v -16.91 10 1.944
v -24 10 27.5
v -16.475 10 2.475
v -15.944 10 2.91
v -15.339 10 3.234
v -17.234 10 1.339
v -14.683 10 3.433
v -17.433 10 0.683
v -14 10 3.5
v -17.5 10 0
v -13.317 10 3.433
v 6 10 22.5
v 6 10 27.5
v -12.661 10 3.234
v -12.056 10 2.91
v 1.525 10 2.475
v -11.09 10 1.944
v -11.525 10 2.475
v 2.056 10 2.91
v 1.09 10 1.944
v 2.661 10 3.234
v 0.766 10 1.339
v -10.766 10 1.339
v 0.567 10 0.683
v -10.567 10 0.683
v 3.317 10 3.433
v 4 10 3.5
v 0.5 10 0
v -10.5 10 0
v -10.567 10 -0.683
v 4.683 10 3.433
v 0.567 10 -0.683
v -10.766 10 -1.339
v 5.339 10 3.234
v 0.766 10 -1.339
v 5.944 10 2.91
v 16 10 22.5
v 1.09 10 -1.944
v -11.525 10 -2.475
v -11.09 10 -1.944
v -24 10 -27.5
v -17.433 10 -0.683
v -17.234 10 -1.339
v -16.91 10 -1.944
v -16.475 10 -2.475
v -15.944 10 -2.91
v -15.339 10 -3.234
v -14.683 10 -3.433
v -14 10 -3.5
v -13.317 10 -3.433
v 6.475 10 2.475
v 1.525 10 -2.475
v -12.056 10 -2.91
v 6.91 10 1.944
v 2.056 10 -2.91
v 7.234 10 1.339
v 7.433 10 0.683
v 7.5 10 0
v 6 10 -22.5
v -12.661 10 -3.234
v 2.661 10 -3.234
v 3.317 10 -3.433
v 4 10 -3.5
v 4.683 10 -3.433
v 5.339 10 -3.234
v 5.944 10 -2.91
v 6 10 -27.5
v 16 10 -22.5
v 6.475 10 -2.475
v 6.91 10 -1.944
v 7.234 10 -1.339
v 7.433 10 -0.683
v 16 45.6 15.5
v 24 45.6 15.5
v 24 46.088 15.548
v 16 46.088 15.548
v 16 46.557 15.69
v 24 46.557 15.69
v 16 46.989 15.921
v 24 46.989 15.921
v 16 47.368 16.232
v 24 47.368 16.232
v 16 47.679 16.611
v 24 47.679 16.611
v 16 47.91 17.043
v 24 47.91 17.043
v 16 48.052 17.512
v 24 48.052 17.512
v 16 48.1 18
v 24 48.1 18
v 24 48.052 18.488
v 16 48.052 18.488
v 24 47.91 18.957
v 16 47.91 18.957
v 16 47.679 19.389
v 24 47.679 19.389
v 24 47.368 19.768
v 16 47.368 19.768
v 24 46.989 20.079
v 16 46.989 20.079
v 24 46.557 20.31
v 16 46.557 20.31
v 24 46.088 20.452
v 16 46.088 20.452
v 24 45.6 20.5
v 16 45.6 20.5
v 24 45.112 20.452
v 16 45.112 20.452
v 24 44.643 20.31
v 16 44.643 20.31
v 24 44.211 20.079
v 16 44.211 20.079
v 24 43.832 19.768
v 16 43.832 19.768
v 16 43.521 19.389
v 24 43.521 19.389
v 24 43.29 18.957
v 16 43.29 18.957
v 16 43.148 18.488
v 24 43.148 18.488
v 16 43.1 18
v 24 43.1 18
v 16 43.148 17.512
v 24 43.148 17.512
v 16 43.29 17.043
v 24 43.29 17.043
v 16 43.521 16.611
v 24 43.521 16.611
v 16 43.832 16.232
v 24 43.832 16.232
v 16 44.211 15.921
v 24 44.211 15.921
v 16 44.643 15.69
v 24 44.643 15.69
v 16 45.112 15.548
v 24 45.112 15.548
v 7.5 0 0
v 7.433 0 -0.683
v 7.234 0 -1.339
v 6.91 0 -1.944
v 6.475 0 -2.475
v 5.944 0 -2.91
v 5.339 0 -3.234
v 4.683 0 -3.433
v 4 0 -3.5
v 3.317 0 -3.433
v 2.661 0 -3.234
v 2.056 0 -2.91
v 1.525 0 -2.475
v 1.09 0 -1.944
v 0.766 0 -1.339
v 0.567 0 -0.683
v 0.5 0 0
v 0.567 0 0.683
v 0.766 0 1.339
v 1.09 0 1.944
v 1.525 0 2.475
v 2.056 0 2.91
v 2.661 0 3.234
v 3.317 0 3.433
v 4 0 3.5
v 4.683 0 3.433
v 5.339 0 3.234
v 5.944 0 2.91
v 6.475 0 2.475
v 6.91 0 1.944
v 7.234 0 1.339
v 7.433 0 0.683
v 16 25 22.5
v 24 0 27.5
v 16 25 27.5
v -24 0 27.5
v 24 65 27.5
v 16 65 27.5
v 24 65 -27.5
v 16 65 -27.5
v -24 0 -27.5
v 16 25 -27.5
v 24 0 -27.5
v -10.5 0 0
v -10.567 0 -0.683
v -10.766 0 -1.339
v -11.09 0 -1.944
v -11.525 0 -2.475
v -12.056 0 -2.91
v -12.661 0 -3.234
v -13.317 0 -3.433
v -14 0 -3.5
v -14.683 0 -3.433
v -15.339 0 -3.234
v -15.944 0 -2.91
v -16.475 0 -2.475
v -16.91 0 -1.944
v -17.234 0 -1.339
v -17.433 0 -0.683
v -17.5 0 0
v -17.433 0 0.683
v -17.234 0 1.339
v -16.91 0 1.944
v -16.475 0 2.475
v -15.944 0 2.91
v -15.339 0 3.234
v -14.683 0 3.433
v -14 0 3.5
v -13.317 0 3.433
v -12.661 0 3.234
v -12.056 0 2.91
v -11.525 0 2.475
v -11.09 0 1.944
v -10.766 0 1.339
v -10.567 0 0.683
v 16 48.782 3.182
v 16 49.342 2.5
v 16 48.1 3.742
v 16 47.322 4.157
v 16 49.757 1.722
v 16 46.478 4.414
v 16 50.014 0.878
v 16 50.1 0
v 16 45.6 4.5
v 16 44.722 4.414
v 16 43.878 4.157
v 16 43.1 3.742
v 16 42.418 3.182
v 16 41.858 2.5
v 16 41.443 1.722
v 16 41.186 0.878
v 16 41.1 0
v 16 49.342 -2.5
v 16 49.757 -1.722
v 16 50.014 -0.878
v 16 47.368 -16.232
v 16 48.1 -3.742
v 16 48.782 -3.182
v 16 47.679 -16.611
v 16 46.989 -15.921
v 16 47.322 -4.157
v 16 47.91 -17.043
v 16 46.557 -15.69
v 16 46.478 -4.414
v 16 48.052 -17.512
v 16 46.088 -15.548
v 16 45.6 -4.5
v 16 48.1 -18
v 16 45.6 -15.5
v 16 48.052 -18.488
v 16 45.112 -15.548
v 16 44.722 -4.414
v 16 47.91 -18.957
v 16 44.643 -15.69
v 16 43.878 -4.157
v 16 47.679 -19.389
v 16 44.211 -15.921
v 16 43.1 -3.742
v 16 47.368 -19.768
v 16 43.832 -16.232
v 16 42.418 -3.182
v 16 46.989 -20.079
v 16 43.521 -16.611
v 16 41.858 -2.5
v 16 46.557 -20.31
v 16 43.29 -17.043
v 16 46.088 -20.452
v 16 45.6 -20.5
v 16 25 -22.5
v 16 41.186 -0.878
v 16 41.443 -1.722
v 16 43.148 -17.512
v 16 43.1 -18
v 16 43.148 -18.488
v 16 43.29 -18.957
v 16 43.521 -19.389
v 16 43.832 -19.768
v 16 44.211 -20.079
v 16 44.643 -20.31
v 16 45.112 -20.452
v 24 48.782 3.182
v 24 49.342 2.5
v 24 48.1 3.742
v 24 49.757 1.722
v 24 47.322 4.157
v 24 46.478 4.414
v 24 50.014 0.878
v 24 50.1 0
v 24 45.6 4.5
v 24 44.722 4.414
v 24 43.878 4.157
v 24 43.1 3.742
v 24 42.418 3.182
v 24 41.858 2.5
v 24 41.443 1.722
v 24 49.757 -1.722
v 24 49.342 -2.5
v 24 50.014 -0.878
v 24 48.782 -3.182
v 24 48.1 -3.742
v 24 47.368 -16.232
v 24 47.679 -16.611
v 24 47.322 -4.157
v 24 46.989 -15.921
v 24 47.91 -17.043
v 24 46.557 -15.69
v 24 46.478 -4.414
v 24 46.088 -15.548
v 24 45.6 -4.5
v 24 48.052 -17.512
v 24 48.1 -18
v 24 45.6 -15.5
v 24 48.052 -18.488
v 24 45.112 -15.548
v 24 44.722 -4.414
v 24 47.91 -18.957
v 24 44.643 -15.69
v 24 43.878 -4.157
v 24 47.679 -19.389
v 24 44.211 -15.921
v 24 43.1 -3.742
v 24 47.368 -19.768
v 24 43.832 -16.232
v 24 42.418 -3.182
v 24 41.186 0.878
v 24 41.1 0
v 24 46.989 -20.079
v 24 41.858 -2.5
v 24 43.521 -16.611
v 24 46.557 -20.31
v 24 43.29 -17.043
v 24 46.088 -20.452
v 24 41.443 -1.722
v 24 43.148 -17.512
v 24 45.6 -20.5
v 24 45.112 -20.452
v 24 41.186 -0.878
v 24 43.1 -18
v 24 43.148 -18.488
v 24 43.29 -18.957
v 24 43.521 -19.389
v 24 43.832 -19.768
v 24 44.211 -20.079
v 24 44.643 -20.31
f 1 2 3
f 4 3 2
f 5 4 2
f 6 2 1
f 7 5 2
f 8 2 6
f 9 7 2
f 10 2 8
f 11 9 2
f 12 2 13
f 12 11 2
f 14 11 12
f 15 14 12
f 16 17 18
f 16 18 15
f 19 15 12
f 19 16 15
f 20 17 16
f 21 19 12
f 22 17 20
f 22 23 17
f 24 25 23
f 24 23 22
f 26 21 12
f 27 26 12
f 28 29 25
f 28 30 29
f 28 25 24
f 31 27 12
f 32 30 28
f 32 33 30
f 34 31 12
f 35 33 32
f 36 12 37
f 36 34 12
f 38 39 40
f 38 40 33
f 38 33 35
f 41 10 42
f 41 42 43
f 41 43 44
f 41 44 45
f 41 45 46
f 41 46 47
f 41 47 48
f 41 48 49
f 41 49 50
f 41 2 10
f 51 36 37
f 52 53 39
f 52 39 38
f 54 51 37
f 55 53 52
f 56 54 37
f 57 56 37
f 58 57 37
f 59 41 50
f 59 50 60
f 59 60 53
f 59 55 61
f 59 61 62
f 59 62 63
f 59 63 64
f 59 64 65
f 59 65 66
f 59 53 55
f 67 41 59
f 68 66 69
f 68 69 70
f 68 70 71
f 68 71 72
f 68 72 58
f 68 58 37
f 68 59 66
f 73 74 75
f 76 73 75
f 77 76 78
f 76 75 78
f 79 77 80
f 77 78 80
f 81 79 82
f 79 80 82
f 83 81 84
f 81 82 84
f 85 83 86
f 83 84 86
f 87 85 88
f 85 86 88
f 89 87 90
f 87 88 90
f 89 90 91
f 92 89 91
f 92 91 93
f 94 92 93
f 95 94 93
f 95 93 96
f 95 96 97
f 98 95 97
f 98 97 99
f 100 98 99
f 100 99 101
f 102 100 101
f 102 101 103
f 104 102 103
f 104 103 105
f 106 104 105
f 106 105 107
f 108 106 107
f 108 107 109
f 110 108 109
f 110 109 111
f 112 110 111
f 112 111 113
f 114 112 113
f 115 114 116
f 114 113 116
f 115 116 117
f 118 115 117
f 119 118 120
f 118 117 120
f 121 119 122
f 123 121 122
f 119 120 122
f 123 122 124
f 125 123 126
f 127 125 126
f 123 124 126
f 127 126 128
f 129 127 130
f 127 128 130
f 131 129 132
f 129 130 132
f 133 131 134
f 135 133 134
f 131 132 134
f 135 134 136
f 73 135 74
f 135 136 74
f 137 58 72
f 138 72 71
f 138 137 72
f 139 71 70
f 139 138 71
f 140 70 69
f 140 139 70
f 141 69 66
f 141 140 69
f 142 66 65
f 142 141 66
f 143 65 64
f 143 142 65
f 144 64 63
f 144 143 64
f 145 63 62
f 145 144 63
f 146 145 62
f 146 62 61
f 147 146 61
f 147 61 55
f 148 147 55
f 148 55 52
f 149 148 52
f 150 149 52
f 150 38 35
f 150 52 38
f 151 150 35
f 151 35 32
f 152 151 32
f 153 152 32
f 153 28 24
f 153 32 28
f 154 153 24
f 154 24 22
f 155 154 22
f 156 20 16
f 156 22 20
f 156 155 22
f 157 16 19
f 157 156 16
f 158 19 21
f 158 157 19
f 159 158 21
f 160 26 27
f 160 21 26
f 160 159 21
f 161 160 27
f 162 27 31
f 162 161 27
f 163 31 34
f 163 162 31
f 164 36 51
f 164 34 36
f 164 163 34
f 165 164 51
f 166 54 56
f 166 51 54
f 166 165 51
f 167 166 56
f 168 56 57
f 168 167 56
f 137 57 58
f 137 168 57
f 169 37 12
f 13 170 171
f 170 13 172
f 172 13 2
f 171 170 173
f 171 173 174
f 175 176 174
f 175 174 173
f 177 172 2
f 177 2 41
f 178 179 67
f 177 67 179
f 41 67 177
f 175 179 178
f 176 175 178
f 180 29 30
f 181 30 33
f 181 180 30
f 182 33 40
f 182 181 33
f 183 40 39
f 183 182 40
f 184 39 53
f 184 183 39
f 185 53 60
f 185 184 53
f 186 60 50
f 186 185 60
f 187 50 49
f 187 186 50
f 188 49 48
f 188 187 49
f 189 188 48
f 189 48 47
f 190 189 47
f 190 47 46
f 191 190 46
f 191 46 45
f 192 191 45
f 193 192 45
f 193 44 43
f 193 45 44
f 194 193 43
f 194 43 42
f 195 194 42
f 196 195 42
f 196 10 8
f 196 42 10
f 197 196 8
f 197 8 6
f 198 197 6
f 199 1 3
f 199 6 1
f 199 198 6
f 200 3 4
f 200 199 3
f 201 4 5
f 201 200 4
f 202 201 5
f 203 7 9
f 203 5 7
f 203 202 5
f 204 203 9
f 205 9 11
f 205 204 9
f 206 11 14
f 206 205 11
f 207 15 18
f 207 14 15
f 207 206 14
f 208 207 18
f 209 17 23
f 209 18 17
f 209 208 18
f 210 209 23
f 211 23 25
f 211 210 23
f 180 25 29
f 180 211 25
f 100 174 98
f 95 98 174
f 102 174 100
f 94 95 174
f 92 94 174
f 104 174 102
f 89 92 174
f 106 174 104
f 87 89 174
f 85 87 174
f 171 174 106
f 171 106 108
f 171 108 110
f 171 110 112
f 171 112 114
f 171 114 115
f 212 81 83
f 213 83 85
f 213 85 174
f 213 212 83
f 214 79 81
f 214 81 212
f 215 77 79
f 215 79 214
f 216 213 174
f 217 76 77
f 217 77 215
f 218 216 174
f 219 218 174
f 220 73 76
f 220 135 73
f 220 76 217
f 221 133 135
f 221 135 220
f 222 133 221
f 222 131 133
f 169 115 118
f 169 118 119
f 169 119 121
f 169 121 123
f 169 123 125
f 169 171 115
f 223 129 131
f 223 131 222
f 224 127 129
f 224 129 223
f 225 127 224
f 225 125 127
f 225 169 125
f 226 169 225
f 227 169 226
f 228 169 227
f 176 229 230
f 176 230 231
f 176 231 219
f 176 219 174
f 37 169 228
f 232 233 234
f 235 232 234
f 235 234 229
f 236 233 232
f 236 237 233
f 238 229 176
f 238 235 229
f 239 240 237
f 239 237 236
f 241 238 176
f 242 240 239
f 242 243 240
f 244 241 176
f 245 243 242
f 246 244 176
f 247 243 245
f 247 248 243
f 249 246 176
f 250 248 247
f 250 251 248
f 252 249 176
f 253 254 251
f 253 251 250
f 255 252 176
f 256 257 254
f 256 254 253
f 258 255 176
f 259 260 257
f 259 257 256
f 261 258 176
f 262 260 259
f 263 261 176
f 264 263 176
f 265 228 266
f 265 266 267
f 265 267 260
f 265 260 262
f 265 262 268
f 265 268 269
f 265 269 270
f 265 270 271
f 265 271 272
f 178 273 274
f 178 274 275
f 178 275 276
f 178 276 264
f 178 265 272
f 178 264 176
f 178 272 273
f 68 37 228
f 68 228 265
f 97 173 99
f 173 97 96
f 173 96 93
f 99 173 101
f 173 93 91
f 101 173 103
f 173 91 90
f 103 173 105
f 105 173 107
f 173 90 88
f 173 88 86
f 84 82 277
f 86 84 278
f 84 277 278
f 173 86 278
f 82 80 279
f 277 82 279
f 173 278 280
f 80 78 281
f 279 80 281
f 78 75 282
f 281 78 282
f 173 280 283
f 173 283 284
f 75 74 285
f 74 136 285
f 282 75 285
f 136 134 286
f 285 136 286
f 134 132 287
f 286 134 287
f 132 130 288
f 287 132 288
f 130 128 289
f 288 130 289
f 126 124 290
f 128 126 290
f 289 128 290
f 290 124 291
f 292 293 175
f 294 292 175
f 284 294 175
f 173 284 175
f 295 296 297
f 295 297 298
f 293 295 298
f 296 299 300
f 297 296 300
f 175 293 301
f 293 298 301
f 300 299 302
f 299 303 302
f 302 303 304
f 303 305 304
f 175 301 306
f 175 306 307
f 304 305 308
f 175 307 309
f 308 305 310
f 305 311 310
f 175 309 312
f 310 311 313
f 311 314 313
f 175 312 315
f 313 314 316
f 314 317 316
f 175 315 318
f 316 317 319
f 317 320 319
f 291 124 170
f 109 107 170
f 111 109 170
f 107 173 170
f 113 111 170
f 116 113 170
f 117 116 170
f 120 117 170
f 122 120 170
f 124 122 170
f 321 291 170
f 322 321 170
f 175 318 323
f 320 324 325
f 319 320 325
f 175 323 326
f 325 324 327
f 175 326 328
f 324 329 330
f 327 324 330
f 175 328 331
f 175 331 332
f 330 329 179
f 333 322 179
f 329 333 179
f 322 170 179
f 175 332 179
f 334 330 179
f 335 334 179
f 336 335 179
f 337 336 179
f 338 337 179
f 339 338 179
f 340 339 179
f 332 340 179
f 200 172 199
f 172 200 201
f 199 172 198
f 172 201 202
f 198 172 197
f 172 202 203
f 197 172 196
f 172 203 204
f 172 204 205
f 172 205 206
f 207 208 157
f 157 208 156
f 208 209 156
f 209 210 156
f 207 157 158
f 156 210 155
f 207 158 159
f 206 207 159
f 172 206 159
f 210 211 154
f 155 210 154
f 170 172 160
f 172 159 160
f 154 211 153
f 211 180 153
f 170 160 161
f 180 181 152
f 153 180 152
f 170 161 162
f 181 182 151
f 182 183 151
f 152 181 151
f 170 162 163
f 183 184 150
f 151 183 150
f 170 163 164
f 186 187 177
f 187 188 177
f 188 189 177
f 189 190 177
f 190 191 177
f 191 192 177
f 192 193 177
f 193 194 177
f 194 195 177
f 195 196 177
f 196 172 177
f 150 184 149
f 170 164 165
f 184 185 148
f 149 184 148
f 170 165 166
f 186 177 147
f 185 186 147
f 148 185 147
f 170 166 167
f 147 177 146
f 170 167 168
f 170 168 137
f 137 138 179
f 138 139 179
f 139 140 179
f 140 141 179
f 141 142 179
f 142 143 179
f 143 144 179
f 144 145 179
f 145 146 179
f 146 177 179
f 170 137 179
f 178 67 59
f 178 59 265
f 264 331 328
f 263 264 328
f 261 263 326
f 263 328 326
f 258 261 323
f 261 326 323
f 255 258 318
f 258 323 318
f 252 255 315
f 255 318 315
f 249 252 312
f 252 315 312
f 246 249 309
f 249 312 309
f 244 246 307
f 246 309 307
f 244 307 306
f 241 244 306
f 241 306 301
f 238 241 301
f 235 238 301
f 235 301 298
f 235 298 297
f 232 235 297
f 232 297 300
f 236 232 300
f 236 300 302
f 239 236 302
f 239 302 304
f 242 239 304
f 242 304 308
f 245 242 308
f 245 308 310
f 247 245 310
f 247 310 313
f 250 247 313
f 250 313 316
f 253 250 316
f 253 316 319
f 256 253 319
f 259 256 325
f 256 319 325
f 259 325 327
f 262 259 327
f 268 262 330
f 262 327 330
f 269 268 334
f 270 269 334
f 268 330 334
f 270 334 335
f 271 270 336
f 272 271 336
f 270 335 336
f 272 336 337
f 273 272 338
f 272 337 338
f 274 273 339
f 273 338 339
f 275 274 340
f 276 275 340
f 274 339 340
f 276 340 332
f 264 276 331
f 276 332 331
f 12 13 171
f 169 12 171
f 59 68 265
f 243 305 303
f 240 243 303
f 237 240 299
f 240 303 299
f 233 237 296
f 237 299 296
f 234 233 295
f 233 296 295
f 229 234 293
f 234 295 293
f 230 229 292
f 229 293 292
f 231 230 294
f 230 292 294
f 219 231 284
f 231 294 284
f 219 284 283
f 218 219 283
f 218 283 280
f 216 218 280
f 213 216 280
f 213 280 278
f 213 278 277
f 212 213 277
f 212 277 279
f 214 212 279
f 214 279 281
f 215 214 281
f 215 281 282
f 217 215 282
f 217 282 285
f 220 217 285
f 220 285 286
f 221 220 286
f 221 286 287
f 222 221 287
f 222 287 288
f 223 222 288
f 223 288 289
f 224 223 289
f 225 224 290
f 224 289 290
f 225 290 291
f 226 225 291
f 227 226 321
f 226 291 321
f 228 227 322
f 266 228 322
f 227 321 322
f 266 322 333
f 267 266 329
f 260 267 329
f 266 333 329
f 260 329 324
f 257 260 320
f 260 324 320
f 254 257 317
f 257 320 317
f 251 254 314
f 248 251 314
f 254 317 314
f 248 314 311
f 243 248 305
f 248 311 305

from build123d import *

# Parameters (mm, degrees)
SKETCH1_W           = 48
SKETCH1_H           = 55
BOSS_EXTRUDE1_DEPTH = 10
SKETCH2_W           = 8
SKETCH2_H           = 55
BOSS_EXTRUDE2_DEPTH = 65
SKETCH3_R           = 4.5
CUT_EXTRUDE1_DEPTH  = 65
SKETCH4_R           = 2.5
CUT_EXTRUDE2_DEPTH  = 65
SKETCH5_R           = 3.5
CUT_EXTRUDE4_DEPTH  = 65
BOSS_EXTRUDE3_DEPTH = 5


with BuildPart() as part:
    # Sketch1 → Boss-Extrude1 (new body)
    with BuildSketch(Plane(origin=(0, 0, 0), x_dir=(1, 0, 0), z_dir=(0, 1, 0))):
        Rectangle(SKETCH1_W, SKETCH1_H)
    extrude(amount=BOSS_EXTRUDE1_DEPTH)

    # Sketch2 → Boss-Extrude2 (add)
    with BuildSketch(Plane(origin=(0, 0, 0), x_dir=(1, 0, 0), z_dir=(0, 1, 0))):
        with Locations((20, 0)):
            Rectangle(SKETCH2_W, SKETCH2_H)
    extrude(amount=BOSS_EXTRUDE2_DEPTH)

    # Sketch3 → Cut-Extrude1 (cut)
    with BuildSketch(Plane(origin=(24, 0, 0), x_dir=(0, 0, -1), z_dir=(1, 0, 0))):
        with Locations((0, 45.6)):
            Circle(SKETCH3_R)
    extrude(amount=-CUT_EXTRUDE1_DEPTH, mode=Mode.SUBTRACT)

    # Sketch4 → Cut-Extrude2 (cut)
    with BuildSketch(Plane(origin=(24, 0, 0), x_dir=(0, 0, -1), z_dir=(1, 0, 0))):
        with Locations((-18, 45.6)):
            Circle(SKETCH4_R)
        with Locations((18, 45.6)):
            Circle(SKETCH4_R)
    extrude(amount=-CUT_EXTRUDE2_DEPTH, mode=Mode.SUBTRACT)

    # Sketch5 → Cut-Extrude4 (cut)
    with BuildSketch(Plane(origin=(0, 0, 0), x_dir=(1, 0, 0), z_dir=(0, 1, 0))):
        with Locations((-14, 0)):
            Circle(SKETCH5_R)
        with Locations((4, 0)):
            Circle(SKETCH5_R)
    extrude(amount=CUT_EXTRUDE4_DEPTH, mode=Mode.SUBTRACT)

    # Sketch8 → Boss-Extrude3 (add)
    with BuildSketch(Plane(origin=(0, 0, -27.5), x_dir=(-1, 0, 0), z_dir=(0, 0, -1))):
        Polygon((-16, 25), (-16, 10), (-6, 10), align=None)
    boss_extrude3 = extrude(amount=-BOSS_EXTRUDE3_DEPTH)

    # Mirror1: Boss-Extrude3 across plane
    add(boss_extrude3.mirror(Plane.XY))


solid = part.part
